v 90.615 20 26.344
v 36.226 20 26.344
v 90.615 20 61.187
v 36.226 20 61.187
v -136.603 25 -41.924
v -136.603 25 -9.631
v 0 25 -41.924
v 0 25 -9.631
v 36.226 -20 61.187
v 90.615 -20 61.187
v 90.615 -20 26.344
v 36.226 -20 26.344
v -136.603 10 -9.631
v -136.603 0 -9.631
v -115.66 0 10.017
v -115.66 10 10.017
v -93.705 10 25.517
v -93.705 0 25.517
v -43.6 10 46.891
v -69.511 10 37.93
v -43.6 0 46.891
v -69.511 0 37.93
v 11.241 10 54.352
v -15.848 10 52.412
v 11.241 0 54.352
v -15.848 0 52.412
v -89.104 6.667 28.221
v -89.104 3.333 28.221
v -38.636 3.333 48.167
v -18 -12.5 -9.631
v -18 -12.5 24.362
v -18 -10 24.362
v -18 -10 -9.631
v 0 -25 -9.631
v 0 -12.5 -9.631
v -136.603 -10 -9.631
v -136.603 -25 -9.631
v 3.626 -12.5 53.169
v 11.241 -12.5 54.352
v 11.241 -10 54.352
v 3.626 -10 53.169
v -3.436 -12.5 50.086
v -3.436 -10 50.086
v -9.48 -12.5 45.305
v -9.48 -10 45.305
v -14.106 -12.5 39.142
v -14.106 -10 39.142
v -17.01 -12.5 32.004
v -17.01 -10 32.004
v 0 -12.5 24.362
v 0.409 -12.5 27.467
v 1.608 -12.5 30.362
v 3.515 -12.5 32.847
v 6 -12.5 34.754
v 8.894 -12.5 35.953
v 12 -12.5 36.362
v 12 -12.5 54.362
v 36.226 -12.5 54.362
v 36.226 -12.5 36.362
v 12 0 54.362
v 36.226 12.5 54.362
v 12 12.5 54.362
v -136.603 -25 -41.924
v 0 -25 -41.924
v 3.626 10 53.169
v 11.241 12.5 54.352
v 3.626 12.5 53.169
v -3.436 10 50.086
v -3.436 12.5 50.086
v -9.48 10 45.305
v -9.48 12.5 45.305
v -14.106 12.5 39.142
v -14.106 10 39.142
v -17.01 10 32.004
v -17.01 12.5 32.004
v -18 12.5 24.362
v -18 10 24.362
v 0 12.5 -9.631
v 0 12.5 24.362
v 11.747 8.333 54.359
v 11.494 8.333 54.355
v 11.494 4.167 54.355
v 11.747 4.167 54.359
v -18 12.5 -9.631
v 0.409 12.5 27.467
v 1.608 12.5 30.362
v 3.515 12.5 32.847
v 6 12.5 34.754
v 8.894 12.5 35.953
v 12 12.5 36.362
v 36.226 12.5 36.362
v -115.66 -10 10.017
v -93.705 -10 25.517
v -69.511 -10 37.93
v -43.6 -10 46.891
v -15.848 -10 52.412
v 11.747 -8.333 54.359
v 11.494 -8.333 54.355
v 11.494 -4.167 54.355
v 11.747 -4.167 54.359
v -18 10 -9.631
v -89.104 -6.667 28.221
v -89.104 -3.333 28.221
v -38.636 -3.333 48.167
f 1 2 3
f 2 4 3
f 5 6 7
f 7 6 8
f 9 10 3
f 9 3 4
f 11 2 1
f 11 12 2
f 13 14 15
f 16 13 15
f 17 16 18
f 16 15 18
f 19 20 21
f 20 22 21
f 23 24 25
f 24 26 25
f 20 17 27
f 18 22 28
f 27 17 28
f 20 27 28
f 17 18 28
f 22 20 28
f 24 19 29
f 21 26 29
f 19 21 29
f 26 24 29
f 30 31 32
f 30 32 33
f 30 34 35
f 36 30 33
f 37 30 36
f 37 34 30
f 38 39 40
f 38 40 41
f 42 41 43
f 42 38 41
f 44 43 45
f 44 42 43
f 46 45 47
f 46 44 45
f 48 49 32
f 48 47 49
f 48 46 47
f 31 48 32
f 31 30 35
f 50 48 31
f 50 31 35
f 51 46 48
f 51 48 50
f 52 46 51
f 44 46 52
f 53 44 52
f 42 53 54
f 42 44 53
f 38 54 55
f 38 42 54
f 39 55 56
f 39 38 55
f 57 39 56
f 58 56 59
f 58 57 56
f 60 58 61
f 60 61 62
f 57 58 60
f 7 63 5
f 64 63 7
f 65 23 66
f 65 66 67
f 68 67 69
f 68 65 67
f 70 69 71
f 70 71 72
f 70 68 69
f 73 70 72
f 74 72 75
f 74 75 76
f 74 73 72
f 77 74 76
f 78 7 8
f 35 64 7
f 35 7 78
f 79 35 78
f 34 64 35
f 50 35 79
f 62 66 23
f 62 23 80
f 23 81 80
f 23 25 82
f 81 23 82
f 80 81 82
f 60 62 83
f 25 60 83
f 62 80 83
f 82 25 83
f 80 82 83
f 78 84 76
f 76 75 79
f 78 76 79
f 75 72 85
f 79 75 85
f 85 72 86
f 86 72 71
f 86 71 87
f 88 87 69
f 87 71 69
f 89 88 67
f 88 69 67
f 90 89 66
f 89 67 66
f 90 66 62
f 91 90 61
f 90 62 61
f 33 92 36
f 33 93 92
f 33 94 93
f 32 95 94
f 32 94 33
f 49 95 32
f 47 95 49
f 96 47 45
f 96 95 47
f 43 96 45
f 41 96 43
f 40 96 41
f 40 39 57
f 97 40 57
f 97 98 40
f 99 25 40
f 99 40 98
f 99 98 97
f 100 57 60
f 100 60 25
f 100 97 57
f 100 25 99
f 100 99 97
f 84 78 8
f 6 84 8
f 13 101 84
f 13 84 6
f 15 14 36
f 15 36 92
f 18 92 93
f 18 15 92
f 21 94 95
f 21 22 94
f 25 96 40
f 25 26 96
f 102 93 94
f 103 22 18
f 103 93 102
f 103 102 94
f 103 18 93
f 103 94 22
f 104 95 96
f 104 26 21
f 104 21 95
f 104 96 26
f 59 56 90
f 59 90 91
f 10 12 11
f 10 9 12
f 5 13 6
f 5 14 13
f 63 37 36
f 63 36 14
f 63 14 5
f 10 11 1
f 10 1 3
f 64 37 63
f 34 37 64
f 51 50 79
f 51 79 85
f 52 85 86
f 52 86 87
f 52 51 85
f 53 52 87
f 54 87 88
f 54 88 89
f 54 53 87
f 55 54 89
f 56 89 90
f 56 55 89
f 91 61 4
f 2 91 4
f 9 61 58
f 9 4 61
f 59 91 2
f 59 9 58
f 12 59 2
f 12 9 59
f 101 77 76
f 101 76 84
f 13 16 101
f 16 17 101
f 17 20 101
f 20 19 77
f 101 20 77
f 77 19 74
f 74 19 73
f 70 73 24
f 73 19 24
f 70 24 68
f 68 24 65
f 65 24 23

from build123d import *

# Parameters (mm, degrees)
F1_DEPTH = 25
F2_DEPTH = 10
F3_DEPTH = 12.5
F4_DEPTH = 20


with BuildPart() as f1:
    # F0 (on Front) → F1 (new body, symmetric)
    with BuildSketch(Plane.XZ):
        Polygon((0, -41.924461), (0, -9.631296), (-17.999999, -9.631296), (-136.603385, -9.631296), (-136.603385, -41.924461), align=None)
    extrude(amount=F1_DEPTH, both=True)

    # F0 (on Front) → F2 (join, symmetric)
    with BuildSketch(Plane.XZ):
        with BuildLine():
            Line((-136.603385, -9.631296), (-17.999999, -9.631296))
            Line((-17.999999, -9.631296), (-17.999999, 24.361512))
            ThreePointArc((-17.999999, 24.361512), (-9.47987, 45.304653), (11.241012, 54.351908))
            add(Edge.make_bspline(
                [(-136.603385, -9.631296), (-91.775244, 38.556366), (-37.152971, 53.664777), (11.241012, 54.351908)],
                knots=[0, 0, 0, 0, 160.954295, 160.954295, 160.954295, 160.954295], degree=3))
        make_face()
    extrude(amount=F2_DEPTH, both=True)

    # F0 (on Front) → F3 (join, symmetric)
    with BuildSketch(Plane.XZ):
        with BuildLine():
            Line((-17.999999, -9.631296), (0, -9.631296))
            Line((0, -9.631296), (0, 24.361512))
            ThreePointArc((0, 24.361512), (3.514719, 32.846793), (12, 36.361512))
            Line((12, 36.361512), (36.226183, 36.361512))
            Line((36.226183, 36.361512), (36.226183, 54.361511))
            Line((36.226183, 54.361511), (12, 54.361511))
            add(Edge.make_bspline(
                [(11.241012, 54.351908), (11.494179, 54.355503), (11.747176, 54.358703), (12, 54.361511)],
                knots=[160.954295, 160.954295, 160.954295, 160.954295, 161.796308, 161.796308, 161.796308, 161.796308], degree=3))
            ThreePointArc((11.241012, 54.351908), (-9.47987, 45.304653), (-17.999999, 24.361512))
            Line((-17.999999, 24.361512), (-17.999999, -9.631296))
        make_face()
    extrude(amount=F3_DEPTH, both=True)

    # F0 (on Front) → F4 (join, symmetric)
    with BuildSketch(Plane.XZ):
        Polygon((36.226183, 54.361511), (36.226183, 36.361512), (36.226183, 26.344426), (90.614673, 26.344426), (90.614673, 61.187055), (36.226183, 61.187055), align=None)
    extrude(amount=F4_DEPTH, both=True)


solid = f1.part
